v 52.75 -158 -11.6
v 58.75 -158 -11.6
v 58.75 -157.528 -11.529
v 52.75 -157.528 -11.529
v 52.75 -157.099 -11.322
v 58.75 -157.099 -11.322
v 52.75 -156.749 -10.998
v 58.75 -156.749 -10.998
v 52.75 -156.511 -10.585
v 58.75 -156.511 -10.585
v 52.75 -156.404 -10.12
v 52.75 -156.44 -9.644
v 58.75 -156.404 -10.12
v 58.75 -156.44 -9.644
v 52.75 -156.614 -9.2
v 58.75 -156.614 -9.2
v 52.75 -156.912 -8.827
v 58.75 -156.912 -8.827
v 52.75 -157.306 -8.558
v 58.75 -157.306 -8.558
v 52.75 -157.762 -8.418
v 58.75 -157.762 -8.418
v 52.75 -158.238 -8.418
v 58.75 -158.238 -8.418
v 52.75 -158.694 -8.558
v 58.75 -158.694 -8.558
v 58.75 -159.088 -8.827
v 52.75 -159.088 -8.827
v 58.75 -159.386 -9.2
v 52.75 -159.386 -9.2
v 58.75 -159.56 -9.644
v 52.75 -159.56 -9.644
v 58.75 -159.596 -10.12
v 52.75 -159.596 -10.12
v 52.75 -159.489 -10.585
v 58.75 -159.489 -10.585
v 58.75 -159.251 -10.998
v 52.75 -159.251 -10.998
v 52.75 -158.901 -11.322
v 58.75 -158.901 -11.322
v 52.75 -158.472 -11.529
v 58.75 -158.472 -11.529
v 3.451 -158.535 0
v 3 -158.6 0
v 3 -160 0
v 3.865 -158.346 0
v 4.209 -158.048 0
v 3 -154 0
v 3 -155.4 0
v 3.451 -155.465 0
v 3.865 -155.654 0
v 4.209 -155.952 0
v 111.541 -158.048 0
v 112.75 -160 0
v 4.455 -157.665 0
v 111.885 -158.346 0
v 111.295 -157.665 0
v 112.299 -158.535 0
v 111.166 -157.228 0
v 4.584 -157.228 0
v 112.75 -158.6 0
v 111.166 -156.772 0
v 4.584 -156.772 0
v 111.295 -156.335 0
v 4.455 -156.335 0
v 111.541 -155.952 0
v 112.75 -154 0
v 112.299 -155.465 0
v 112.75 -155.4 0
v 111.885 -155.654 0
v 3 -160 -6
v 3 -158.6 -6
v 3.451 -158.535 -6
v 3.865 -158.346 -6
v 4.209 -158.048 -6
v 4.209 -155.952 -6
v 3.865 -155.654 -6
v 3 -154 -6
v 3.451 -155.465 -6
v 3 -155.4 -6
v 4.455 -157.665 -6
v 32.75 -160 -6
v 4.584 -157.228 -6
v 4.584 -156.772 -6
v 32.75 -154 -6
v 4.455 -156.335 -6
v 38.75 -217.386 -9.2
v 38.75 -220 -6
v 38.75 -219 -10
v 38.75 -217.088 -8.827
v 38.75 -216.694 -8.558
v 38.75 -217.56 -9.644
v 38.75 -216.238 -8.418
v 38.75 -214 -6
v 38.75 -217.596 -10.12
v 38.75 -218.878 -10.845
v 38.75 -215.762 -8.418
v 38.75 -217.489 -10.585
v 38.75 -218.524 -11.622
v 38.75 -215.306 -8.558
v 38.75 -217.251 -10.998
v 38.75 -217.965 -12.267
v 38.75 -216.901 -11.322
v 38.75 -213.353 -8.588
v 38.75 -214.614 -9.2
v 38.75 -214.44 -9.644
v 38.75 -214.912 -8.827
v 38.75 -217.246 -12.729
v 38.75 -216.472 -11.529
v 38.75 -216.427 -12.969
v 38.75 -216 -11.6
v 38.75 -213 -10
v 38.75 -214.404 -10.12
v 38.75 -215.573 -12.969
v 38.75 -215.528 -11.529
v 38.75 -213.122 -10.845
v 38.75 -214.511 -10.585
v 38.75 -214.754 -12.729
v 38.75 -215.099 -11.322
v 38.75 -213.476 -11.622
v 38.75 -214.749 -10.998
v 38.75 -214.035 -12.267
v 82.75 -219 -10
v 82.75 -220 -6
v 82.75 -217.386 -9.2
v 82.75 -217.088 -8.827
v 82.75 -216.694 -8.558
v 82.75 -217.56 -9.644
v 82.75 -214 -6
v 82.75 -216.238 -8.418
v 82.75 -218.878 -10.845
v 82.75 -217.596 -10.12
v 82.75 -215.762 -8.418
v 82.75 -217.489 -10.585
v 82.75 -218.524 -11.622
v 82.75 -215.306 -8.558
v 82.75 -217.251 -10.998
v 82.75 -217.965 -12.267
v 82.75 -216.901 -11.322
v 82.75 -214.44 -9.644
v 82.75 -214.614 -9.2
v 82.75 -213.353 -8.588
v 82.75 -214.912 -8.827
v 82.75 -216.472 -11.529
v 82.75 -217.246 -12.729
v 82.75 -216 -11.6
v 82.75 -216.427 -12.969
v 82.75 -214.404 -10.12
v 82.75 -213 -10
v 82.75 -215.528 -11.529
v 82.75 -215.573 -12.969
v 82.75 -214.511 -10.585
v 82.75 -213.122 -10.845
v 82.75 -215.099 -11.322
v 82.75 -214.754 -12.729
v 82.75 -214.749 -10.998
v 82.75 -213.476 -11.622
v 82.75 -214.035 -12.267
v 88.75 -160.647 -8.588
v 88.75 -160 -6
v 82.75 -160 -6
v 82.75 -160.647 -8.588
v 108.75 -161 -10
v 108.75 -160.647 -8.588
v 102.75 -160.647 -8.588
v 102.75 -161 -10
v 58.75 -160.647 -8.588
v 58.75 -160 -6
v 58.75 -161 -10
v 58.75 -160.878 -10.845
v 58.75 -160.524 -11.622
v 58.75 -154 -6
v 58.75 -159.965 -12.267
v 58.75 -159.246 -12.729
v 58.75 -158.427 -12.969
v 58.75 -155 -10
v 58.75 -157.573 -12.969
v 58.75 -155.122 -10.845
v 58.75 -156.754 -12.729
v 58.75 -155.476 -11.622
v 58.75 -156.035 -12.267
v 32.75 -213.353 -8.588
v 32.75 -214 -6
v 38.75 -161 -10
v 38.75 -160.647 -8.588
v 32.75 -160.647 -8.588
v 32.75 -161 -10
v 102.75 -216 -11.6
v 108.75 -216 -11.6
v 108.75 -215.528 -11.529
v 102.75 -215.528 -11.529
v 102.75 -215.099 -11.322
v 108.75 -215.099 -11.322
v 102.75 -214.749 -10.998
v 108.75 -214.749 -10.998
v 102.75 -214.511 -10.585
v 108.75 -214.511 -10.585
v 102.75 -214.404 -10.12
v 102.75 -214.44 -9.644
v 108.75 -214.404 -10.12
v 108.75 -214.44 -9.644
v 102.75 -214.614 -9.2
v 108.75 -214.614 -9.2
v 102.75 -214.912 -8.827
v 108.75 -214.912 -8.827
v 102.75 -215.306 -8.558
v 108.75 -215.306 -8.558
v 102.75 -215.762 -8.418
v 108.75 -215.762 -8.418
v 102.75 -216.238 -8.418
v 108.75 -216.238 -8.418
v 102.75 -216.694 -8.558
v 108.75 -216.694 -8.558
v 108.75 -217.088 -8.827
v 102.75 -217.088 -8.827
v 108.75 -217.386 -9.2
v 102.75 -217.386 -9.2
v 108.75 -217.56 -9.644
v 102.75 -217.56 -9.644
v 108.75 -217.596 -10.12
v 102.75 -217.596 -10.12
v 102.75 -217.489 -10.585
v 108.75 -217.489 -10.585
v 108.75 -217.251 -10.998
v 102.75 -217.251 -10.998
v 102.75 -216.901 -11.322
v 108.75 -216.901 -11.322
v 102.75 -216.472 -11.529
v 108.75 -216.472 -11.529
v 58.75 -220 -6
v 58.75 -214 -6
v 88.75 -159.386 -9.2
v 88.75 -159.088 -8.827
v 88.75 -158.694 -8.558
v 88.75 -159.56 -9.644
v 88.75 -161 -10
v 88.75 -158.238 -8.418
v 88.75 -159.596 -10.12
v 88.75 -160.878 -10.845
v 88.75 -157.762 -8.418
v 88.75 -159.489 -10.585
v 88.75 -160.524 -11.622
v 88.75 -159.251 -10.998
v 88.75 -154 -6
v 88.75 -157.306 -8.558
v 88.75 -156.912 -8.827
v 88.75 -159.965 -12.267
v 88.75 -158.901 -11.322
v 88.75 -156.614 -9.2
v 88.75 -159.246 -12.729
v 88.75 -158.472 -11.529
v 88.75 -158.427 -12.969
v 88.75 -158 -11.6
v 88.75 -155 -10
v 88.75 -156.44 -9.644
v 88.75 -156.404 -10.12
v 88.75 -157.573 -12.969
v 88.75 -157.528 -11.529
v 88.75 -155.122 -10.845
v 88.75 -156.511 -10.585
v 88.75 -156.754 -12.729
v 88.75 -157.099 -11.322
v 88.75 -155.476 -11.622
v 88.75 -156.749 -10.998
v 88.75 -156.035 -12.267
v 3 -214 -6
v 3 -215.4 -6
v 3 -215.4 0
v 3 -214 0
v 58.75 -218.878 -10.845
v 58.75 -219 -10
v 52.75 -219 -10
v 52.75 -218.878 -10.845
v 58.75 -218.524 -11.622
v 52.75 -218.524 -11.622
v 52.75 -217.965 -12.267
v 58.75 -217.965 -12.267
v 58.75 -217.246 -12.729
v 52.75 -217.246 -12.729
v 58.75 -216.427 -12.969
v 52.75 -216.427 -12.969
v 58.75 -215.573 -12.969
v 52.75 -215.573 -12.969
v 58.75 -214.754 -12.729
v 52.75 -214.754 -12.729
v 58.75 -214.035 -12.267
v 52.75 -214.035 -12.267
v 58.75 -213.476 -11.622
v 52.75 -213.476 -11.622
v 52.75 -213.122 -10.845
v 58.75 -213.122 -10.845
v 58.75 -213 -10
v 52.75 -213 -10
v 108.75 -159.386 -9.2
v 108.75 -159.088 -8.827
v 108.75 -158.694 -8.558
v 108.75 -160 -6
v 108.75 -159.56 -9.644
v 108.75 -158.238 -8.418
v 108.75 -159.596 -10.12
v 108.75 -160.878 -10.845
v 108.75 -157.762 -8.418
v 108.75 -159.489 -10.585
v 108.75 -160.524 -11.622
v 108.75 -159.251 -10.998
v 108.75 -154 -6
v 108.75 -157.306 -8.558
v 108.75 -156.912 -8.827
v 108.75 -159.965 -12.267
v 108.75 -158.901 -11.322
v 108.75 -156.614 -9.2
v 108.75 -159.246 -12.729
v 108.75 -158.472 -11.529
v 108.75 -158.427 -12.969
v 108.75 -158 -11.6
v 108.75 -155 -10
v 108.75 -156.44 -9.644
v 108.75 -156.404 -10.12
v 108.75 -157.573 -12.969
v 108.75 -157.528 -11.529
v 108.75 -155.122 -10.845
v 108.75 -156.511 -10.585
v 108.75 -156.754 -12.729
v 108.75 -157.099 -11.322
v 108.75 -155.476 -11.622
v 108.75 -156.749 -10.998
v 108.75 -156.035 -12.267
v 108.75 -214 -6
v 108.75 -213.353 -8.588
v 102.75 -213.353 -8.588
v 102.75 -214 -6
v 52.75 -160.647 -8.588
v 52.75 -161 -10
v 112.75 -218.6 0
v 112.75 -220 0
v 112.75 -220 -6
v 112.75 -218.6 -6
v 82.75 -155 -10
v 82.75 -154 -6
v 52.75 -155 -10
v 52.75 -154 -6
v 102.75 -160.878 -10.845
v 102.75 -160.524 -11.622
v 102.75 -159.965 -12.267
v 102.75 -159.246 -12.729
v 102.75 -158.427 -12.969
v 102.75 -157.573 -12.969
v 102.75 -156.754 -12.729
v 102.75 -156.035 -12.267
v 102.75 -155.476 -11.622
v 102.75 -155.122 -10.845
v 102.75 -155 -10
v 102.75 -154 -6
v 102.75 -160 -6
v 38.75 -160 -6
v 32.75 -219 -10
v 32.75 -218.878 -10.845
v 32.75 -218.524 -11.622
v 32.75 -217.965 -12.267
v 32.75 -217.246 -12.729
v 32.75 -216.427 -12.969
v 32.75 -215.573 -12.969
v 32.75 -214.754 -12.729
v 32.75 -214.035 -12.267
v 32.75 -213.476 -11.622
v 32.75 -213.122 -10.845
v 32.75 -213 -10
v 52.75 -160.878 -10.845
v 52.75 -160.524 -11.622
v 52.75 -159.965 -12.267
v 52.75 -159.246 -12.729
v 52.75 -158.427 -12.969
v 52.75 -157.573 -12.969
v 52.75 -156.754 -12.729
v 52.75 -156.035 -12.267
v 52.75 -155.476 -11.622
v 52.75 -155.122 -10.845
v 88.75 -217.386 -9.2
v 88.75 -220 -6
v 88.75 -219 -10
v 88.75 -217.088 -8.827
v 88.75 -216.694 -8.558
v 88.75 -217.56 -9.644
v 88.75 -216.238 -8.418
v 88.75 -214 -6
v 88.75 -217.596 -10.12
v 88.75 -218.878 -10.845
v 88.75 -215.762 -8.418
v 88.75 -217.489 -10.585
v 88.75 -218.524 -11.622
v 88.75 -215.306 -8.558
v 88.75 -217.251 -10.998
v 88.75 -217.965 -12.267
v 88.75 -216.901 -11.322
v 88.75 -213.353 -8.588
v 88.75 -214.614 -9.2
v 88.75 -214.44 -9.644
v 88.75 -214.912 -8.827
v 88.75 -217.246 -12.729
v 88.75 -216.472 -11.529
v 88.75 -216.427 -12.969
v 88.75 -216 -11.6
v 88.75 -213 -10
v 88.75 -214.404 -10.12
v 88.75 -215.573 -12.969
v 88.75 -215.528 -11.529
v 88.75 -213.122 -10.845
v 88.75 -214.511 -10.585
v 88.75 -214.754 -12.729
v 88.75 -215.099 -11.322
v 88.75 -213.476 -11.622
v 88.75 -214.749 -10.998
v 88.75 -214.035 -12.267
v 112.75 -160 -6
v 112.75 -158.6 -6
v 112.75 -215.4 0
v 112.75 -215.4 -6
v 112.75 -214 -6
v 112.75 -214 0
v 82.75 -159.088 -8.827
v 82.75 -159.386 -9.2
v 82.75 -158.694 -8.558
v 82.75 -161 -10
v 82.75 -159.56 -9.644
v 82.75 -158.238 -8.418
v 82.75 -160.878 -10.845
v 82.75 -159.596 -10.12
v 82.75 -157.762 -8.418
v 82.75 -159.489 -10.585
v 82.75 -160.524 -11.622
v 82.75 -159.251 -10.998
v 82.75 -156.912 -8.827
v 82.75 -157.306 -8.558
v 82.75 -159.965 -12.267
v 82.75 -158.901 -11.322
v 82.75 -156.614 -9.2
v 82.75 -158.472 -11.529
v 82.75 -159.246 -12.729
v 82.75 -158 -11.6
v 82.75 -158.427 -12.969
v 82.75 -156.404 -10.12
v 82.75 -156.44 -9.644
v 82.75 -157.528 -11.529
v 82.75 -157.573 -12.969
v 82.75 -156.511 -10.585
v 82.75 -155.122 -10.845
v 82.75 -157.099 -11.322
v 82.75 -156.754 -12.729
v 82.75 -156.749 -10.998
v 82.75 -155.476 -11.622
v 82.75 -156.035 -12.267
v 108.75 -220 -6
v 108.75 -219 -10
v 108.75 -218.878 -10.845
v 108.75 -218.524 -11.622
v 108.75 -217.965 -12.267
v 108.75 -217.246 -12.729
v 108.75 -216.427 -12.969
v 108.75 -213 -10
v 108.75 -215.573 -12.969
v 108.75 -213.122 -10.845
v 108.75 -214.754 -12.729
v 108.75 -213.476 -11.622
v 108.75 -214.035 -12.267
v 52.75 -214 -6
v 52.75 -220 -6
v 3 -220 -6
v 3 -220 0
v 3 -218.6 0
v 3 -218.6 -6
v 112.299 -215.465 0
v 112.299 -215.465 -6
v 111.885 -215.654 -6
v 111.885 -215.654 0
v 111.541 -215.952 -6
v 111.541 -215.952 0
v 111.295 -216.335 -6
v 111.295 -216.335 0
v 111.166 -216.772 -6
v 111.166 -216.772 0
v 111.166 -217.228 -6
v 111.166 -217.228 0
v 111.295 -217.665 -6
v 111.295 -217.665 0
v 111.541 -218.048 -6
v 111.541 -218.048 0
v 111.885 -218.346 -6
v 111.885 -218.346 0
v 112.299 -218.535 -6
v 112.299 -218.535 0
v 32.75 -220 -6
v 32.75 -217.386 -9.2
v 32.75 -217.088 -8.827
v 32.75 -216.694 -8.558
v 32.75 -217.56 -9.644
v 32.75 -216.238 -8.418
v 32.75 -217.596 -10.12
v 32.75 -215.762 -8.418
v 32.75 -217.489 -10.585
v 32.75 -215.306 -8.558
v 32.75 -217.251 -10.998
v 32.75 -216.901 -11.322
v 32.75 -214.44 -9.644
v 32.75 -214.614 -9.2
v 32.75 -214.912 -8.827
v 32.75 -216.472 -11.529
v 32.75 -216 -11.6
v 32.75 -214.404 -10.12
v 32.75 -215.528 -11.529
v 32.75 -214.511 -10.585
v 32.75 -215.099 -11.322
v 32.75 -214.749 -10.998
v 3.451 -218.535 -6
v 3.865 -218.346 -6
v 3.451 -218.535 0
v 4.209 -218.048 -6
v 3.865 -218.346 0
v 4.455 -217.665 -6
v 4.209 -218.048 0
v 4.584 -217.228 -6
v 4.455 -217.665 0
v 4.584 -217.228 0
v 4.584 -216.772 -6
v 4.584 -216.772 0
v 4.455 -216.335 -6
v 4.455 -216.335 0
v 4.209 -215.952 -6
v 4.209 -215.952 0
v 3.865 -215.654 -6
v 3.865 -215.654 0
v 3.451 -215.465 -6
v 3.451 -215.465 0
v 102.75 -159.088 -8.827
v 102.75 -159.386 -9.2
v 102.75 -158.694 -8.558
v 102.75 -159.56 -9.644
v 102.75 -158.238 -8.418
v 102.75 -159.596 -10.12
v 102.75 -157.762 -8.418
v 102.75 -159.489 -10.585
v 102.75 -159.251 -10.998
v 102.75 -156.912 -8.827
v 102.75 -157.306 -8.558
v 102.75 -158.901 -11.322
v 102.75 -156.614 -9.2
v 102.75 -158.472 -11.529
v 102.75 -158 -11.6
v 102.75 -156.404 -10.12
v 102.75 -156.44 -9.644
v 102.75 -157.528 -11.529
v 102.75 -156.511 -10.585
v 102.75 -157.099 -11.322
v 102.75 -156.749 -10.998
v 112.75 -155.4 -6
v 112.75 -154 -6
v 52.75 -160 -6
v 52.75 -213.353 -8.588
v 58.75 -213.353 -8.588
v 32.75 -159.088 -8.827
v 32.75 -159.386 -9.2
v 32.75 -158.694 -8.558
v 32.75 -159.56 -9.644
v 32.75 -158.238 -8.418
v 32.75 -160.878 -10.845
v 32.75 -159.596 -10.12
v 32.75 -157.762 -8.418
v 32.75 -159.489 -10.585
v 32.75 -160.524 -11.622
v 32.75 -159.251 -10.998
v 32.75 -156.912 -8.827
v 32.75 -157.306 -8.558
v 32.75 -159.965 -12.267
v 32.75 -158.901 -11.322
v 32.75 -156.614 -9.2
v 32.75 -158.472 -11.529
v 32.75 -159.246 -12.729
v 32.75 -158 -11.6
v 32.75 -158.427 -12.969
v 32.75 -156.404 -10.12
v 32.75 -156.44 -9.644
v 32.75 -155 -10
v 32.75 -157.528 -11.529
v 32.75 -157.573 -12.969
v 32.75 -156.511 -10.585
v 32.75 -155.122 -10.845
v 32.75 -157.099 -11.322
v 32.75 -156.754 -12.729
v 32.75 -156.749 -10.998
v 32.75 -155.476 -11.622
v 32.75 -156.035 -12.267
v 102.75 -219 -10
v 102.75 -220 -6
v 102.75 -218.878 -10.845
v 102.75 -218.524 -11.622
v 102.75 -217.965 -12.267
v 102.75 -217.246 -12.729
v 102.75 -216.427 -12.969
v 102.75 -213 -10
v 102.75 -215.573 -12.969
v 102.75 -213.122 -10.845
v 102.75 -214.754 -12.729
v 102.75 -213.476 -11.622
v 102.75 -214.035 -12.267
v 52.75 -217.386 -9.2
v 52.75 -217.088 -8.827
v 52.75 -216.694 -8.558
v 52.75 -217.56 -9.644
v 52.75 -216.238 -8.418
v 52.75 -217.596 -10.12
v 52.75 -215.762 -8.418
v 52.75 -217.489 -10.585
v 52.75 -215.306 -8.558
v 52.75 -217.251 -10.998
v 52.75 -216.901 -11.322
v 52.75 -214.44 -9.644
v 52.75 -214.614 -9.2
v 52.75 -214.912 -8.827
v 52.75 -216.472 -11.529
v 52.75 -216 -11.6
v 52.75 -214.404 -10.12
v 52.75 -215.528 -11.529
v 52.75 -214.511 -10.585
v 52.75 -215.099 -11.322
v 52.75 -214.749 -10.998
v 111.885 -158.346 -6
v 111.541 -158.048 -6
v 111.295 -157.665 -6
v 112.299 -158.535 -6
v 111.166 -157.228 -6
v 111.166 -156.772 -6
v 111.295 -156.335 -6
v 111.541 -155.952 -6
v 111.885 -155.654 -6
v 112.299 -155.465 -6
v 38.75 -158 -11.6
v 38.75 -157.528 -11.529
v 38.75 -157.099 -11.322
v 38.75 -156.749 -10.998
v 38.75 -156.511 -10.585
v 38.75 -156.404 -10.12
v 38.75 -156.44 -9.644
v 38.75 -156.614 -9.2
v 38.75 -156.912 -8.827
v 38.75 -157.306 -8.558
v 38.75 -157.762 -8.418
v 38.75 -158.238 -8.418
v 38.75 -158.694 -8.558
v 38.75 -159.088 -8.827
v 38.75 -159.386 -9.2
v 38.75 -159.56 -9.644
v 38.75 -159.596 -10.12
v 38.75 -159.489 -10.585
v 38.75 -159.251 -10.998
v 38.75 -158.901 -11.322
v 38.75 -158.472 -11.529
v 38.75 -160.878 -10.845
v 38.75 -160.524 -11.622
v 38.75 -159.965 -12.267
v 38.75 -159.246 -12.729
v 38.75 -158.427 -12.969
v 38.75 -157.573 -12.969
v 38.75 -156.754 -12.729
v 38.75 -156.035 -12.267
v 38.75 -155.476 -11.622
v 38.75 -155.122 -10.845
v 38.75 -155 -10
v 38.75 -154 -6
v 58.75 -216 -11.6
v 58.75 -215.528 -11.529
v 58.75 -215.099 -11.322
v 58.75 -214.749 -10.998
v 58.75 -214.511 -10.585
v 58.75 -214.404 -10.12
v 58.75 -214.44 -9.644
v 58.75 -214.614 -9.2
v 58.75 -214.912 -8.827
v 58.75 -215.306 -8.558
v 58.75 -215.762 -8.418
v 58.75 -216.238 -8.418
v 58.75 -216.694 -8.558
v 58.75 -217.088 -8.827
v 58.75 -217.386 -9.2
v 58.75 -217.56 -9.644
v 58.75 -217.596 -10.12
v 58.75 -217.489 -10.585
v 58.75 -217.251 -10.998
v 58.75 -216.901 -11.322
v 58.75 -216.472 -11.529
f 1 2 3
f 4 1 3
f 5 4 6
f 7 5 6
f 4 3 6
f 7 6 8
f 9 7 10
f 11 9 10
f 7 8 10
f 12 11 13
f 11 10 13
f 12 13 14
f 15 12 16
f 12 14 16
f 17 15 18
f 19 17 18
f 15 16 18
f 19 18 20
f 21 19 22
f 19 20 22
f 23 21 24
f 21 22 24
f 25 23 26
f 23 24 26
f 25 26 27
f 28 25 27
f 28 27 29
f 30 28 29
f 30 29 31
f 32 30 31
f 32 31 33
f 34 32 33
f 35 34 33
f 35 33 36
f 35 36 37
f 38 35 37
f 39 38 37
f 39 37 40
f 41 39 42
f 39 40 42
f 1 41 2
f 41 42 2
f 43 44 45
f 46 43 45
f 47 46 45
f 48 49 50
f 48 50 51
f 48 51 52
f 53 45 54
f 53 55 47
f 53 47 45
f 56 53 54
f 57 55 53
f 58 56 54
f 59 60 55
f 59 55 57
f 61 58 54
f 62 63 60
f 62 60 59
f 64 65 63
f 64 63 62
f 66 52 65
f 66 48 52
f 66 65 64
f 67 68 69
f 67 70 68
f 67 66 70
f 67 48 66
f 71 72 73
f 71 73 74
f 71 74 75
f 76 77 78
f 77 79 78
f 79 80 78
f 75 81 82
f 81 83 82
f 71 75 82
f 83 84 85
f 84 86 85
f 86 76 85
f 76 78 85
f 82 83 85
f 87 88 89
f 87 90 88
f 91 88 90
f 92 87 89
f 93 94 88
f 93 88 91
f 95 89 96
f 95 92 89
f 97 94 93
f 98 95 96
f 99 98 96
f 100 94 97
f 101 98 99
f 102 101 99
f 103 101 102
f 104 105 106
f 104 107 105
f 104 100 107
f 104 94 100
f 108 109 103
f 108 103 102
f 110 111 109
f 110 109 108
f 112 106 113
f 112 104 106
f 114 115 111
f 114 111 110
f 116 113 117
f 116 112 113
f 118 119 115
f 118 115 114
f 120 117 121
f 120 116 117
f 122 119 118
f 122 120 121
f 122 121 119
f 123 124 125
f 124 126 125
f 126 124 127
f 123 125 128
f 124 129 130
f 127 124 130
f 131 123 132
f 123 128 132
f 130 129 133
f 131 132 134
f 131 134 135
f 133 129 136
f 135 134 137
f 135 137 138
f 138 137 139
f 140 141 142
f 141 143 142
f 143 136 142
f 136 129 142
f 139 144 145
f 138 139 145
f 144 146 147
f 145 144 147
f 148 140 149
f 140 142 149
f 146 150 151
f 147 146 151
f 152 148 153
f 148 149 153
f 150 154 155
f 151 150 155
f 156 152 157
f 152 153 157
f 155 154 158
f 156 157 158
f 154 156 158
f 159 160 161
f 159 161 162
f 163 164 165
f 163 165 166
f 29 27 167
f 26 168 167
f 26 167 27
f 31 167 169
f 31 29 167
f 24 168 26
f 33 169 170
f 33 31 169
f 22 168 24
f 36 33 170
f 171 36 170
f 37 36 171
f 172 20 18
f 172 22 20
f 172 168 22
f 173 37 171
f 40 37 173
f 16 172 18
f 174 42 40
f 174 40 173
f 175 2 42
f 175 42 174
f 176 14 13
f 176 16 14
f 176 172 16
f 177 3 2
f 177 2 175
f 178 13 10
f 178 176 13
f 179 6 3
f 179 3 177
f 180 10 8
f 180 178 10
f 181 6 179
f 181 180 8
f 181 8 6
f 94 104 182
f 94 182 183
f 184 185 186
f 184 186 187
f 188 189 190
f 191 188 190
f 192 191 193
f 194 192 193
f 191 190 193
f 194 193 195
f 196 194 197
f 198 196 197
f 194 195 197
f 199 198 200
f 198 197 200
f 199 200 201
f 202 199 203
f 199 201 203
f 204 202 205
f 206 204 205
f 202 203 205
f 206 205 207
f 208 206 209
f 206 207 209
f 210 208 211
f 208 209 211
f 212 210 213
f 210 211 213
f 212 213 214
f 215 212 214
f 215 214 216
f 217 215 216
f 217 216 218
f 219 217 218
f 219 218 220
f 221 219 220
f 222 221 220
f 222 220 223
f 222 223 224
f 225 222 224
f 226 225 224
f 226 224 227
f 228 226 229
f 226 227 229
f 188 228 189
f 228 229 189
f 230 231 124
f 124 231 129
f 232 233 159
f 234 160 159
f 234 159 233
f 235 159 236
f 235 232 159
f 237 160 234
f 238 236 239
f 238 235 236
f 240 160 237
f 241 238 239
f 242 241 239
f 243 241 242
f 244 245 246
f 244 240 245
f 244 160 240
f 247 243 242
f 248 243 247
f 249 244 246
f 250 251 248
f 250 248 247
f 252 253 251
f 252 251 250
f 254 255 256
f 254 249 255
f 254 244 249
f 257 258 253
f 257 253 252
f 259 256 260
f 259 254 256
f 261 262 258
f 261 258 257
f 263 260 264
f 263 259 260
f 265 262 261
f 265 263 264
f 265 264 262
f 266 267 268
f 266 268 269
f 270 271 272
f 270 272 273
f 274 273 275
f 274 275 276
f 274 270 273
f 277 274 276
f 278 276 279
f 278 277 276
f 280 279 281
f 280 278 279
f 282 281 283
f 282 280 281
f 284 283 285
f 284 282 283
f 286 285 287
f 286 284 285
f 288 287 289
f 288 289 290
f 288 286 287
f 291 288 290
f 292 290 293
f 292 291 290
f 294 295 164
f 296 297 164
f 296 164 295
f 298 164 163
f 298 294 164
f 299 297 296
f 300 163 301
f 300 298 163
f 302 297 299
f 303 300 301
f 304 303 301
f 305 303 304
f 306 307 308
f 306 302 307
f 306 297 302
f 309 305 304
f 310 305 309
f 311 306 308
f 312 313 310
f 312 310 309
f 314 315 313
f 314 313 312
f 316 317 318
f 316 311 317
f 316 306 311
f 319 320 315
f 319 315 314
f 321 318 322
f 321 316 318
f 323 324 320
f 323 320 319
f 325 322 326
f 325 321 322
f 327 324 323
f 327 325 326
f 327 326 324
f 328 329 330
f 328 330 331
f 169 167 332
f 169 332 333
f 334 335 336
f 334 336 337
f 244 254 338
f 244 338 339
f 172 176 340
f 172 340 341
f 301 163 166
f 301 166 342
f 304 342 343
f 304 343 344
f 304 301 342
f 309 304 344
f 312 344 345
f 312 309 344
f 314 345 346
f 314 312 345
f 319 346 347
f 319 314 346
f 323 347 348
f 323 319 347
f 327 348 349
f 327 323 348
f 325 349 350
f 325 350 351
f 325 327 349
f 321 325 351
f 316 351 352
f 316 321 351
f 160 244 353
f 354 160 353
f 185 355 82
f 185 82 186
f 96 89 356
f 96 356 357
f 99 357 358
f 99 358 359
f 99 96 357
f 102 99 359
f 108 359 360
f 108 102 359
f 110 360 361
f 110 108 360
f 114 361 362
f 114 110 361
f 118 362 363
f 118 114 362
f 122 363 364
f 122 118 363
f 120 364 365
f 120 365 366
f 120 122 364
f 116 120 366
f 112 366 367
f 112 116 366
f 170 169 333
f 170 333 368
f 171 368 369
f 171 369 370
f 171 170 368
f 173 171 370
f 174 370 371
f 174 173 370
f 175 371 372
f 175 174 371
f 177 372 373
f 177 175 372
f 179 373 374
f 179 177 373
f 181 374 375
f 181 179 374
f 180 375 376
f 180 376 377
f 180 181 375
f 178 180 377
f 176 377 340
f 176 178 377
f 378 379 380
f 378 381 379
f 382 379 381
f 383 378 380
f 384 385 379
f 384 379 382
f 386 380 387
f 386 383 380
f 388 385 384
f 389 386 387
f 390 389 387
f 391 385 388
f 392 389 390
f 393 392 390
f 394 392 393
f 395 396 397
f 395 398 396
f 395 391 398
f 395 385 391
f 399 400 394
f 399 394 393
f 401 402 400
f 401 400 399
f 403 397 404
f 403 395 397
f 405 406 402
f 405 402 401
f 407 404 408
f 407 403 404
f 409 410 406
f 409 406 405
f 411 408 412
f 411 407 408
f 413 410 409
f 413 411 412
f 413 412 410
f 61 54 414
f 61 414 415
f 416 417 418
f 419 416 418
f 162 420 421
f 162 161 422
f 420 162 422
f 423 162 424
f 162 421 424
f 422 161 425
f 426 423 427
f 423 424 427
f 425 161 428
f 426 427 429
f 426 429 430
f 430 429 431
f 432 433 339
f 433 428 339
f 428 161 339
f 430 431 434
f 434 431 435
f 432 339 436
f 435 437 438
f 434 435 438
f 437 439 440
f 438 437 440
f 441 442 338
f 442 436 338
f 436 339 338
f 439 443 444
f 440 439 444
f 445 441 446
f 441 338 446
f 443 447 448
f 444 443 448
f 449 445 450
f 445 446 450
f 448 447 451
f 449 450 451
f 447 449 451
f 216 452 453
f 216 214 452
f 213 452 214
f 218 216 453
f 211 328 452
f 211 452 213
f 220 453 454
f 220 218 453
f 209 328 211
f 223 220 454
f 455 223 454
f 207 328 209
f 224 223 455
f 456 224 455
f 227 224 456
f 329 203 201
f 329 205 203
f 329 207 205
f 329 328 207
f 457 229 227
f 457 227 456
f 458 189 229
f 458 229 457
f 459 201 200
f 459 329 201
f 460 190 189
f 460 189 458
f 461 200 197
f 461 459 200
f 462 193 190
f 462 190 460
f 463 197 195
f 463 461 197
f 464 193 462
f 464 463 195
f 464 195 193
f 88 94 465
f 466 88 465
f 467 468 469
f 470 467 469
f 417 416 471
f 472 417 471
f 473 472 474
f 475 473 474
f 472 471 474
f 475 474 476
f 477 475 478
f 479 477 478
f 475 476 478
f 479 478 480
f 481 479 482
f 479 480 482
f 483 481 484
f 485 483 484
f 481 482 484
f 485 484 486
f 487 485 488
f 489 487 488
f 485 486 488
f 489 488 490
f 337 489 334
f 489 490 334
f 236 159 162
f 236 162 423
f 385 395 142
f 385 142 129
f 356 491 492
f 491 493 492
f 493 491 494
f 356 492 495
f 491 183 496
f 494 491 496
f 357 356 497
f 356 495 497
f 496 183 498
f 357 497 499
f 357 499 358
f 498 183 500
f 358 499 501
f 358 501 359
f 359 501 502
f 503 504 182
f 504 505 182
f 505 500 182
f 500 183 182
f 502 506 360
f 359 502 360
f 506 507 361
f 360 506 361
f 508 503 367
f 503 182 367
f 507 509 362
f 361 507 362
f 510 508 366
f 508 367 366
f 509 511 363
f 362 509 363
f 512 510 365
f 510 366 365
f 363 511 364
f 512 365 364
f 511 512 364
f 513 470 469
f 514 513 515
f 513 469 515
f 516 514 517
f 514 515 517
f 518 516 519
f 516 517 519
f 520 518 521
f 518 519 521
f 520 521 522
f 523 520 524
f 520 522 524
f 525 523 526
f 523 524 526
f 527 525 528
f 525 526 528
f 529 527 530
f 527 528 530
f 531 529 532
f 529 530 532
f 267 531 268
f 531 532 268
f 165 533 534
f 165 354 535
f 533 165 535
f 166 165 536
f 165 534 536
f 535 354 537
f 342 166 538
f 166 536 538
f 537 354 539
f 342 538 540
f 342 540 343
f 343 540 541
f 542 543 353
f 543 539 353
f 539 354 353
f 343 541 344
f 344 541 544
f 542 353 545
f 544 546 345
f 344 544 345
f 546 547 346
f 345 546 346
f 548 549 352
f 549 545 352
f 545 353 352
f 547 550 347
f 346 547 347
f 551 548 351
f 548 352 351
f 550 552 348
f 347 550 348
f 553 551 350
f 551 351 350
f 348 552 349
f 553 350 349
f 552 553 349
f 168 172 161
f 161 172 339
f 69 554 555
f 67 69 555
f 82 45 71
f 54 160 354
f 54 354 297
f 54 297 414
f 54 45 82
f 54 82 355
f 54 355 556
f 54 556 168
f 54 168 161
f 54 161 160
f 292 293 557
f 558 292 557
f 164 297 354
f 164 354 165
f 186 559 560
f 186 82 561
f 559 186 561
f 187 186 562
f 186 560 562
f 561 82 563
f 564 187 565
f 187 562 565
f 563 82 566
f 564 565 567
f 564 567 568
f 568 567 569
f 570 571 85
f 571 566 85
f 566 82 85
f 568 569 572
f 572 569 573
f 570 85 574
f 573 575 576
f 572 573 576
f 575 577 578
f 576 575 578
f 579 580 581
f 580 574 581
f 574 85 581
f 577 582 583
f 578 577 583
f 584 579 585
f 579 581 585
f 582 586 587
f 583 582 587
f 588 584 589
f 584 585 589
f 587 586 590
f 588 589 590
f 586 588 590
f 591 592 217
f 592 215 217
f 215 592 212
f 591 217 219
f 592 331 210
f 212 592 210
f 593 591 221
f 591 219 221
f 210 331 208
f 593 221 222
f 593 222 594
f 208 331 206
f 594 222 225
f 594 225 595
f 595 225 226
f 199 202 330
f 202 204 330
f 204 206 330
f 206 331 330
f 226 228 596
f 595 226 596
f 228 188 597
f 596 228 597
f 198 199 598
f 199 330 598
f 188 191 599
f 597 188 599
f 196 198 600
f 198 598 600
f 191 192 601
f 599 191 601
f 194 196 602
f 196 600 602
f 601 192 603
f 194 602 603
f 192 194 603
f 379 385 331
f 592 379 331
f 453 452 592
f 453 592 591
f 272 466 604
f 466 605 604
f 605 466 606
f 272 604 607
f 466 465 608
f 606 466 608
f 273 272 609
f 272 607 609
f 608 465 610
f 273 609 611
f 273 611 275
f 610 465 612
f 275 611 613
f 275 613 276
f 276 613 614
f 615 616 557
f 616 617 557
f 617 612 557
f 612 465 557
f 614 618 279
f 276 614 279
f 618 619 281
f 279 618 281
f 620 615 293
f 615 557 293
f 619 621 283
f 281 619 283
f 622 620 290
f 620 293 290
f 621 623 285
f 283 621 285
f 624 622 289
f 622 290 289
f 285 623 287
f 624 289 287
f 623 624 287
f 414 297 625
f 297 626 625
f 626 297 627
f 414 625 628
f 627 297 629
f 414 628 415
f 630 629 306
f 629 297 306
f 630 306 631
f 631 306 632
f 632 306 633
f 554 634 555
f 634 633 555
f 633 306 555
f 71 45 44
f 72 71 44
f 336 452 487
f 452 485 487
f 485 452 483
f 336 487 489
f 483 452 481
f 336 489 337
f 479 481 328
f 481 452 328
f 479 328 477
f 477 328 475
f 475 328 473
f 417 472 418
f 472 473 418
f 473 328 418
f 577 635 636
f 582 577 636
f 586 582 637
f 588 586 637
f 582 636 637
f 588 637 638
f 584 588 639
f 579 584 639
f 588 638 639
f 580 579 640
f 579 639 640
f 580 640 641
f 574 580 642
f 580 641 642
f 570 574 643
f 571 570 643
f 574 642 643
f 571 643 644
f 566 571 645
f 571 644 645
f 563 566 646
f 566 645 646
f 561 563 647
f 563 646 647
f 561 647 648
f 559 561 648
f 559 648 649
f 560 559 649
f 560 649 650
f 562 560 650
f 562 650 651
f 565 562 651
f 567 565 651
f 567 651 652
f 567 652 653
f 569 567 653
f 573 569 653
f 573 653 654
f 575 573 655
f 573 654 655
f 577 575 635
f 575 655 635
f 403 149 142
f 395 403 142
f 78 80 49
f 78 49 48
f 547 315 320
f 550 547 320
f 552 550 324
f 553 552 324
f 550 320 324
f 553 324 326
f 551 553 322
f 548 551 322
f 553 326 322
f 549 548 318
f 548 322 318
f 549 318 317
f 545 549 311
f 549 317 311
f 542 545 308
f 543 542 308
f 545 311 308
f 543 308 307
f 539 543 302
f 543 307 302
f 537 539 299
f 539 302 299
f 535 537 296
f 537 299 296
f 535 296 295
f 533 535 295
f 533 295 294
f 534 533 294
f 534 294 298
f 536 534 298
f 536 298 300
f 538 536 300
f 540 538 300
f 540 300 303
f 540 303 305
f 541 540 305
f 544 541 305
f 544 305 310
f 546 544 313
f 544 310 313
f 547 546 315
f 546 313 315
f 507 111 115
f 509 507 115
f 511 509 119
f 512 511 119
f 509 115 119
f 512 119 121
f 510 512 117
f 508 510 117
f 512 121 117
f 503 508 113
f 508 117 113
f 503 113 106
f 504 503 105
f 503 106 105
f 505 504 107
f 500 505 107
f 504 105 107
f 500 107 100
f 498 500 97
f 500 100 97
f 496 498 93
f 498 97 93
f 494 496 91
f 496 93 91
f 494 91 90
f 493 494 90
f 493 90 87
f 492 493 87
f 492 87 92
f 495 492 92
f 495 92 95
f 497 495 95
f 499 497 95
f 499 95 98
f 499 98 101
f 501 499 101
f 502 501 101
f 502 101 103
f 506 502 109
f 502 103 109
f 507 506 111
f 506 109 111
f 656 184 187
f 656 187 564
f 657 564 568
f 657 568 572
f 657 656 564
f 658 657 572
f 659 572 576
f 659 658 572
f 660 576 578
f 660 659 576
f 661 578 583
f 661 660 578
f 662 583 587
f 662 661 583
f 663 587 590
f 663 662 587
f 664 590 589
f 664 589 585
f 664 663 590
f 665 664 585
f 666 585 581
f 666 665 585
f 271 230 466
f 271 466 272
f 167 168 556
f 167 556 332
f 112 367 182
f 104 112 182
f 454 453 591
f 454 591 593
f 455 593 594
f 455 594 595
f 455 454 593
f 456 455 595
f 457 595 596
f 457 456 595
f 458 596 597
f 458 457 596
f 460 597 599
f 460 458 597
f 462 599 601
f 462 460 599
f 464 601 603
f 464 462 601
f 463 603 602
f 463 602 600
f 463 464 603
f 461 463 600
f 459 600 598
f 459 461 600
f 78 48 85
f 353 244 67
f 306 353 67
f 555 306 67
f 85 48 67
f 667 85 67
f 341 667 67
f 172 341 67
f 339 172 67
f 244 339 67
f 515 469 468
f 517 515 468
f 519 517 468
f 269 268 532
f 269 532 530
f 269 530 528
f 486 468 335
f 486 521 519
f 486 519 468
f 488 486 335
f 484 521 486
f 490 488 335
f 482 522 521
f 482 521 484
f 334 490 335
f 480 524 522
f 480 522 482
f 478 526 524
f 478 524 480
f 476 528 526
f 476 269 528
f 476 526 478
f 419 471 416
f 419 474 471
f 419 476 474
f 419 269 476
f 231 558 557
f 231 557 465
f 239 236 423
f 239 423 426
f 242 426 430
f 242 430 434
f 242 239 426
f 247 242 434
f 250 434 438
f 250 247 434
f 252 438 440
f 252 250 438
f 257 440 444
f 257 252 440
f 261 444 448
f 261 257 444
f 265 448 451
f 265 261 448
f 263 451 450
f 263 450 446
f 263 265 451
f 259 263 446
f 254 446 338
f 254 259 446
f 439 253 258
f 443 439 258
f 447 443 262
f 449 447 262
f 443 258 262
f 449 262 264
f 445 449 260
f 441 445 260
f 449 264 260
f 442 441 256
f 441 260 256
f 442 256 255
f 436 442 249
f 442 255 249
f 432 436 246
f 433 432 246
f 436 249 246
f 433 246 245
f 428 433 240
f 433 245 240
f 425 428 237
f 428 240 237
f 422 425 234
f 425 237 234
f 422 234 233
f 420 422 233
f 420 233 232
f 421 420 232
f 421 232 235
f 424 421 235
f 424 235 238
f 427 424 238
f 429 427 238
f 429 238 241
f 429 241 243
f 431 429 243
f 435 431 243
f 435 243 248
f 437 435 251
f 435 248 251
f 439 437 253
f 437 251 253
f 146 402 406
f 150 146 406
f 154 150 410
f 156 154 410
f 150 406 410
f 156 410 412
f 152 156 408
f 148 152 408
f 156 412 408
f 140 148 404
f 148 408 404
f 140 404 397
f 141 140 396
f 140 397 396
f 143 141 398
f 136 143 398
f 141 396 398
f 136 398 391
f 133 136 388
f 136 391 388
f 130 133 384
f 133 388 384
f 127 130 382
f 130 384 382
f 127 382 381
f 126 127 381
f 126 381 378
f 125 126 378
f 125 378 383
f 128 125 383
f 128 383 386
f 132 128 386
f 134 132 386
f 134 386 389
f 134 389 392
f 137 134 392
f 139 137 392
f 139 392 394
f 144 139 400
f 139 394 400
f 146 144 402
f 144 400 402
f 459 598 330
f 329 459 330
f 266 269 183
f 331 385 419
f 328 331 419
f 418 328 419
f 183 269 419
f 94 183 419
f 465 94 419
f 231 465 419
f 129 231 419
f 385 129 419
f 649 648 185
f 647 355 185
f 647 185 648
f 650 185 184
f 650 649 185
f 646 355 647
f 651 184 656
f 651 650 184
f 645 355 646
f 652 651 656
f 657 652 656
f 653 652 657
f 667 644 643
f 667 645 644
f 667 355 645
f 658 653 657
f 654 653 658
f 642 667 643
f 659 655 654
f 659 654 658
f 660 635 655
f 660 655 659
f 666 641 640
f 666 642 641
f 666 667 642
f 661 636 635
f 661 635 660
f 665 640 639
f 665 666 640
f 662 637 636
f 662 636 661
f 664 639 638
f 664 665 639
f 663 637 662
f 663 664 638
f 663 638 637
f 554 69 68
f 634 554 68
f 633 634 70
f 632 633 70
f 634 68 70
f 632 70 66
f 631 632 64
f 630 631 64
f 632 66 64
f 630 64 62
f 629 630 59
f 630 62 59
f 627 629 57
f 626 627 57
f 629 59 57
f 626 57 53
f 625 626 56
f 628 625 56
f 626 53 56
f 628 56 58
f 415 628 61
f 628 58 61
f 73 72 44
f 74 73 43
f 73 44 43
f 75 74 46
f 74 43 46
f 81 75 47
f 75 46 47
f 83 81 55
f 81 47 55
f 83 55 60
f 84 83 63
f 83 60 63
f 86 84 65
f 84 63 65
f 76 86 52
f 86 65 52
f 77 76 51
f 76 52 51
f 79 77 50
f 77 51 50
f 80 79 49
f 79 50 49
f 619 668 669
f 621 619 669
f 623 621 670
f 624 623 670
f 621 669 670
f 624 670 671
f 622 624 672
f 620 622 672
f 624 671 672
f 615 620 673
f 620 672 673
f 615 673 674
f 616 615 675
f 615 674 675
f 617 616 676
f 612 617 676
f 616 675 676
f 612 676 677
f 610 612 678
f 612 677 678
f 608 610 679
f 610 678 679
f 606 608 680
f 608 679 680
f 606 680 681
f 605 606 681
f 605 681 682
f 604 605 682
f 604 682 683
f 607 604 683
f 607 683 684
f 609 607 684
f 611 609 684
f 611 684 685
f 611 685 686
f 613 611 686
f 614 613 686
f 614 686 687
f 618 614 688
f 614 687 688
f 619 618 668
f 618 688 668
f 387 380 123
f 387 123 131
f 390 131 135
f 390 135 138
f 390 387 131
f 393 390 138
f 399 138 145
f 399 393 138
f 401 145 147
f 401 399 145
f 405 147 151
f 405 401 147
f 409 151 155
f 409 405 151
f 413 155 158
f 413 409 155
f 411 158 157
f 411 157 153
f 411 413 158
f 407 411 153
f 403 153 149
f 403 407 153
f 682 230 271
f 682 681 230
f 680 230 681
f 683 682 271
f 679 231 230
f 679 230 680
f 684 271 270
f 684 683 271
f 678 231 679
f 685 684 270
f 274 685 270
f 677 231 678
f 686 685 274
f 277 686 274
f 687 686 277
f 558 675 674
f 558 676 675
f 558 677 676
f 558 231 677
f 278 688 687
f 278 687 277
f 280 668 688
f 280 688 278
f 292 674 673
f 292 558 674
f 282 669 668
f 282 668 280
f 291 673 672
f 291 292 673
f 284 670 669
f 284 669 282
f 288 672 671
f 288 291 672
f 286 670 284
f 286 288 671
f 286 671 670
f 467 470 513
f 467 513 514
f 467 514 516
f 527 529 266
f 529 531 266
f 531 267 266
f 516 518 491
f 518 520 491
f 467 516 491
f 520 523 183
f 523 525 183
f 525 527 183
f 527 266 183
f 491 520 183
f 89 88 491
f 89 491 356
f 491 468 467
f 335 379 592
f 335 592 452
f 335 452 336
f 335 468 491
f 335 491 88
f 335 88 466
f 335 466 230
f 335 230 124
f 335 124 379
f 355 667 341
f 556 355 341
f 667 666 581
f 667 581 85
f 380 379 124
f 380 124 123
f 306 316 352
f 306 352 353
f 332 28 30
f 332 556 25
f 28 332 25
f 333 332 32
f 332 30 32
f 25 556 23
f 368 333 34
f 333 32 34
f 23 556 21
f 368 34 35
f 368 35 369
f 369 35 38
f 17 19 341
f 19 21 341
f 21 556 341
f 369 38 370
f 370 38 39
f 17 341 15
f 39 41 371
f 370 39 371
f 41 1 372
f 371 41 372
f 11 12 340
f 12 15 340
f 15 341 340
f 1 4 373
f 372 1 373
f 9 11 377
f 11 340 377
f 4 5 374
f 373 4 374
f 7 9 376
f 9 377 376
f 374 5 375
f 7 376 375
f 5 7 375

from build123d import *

# Parameters (mm, degrees)
SKETCH1_W             = 109.75
SKETCH1_H             = 6
BOSS_EXTRUDE1_DEPTH   = 6
BOSS_EXTRUDE1_2_DEPTH = 6
BOSS_EXTRUDE2_START   = -4
SKETCH2_R             = 1.6
BOSS_EXTRUDE2_DEPTH   = 6
LPATTERN1_COUNT       = 8
LPATTERN1_PITCH       = 10
CUT_EXTRUDE1_REACH    = 249.551
SKETCH3_R             = 1.6


with BuildPart() as part:
    # Sketch1 → Boss-Extrude1 (new body)
    with BuildSketch(Plane.XY):
        with Locations((57.875, -217)):
            Rectangle(SKETCH1_W, SKETCH1_H)
    extrude(amount=-BOSS_EXTRUDE1_DEPTH)



with BuildPart() as body_2:
    # Sketch1 → Boss-Extrude1 2 (new body)
    with BuildSketch(Plane.XY):
        with Locations((57.875, -157)):
            Rectangle(SKETCH1_W, SKETCH1_H)
    extrude(amount=-BOSS_EXTRUDE1_2_DEPTH)


with BuildPart() as part_1:
    add(part.part)

    add(body_2.part)  # Boss-Extrude2 merges body 2
    # Sketch2 → Boss-Extrude2 (add)
    # profile 1 of 4: a face of its own
    with BuildSketch(Plane(origin=(112.75, 0, 0), x_dir=(0, 0, -1), z_dir=(1, 0, 0)).offset(BOSS_EXTRUDE2_START)):
        with BuildLine():
            Line((10, -213), (8.588235294, -213.352941176))
            ThreePointArc((8.588235294, -213.352941176), (7.0895725, -216.727606875), (10, -219))
            ThreePointArc((10, -219), (13, -216), (10, -213))
        make_face()
        with Locations((10, -216)):
            Circle(SKETCH2_R, mode=Mode.SUBTRACT)
    # profile 2 of 4: a face of its own
    with BuildSketch(Plane(origin=(112.75, 0, 0), x_dir=(0, 0, -1), z_dir=(1, 0, 0)).offset(BOSS_EXTRUDE2_START)):
        with BuildLine():
            Line((8.588235294, -213.352941176), (6, -214))
            Line((6, -214), (6, -220))
            Line((6, -220), (10, -219))
            ThreePointArc((10, -219), (7.0895725, -216.727606875), (8.588235294, -213.352941176))
        make_face()
    # profile 3 of 4: a face of its own
    with BuildSketch(Plane(origin=(112.75, 0, 0), x_dir=(0, 0, -1), z_dir=(1, 0, 0)).offset(BOSS_EXTRUDE2_START)):
        with BuildLine():
            ThreePointArc((10, -161), (13, -158), (10, -155))
            ThreePointArc((10, -155), (7.0895725, -157.272393125), (8.588235294, -160.647058824))
            Line((8.588235294, -160.647058824), (10, -161))
        make_face()
        with Locations((10, -158)):
            Circle(SKETCH2_R, mode=Mode.SUBTRACT)
    # profile 4 of 4: a face of its own
    with BuildSketch(Plane(origin=(112.75, 0, 0), x_dir=(0, 0, -1), z_dir=(1, 0, 0)).offset(BOSS_EXTRUDE2_START)):
        with BuildLine():
            Line((10, -155), (6, -154))
            Line((6, -154), (6, -160))
            Line((6, -160), (8.588235294, -160.647058824))
            ThreePointArc((8.588235294, -160.647058824), (7.0895725, -157.272393125), (10, -155))
        make_face()
    boss_extrude2 = extrude(amount=-BOSS_EXTRUDE2_DEPTH)

    # LPattern1: Boss-Extrude2 ×8, 4 skipped
    with Locations(*[(-i * LPATTERN1_PITCH, 0, 0) for i in range(1, LPATTERN1_COUNT) if i not in (1, 3, 4, 6)]):
        add(boss_extrude2)

    # Sketch3 → Cut-Extrude1 (cut, up to next)
    with BuildSketch(Plane.XY, mode=Mode.PRIVATE) as cut_extrude1_sk1:
        with Locations((3, -217)):
            Circle(SKETCH3_R)
    cut_extrude1_tool1 = extrude(cut_extrude1_sk1.sketch, amount=-CUT_EXTRUDE1_REACH, mode=Mode.PRIVATE) & part_1.part
    # Sketch3 → Cut-Extrude1 (cut, up to next)
    with BuildSketch(Plane.XY, mode=Mode.PRIVATE) as cut_extrude1_sk2:
        with Locations((3, -157)):
            Circle(SKETCH3_R)
    cut_extrude1_tool2 = extrude(cut_extrude1_sk2.sketch, amount=-CUT_EXTRUDE1_REACH, mode=Mode.PRIVATE) & part_1.part
    # Sketch3 → Cut-Extrude1 (cut, up to next)
    with BuildSketch(Plane.XY, mode=Mode.PRIVATE) as cut_extrude1_sk3:
        with Locations((112.75, -157)):
            Circle(SKETCH3_R)
    cut_extrude1_tool3 = extrude(cut_extrude1_sk3.sketch, amount=-CUT_EXTRUDE1_REACH, mode=Mode.PRIVATE) & part_1.part
    # Sketch3 → Cut-Extrude1 (cut, up to next)
    with BuildSketch(Plane.XY, mode=Mode.PRIVATE) as cut_extrude1_sk4:
        with Locations((112.75, -217)):
            Circle(SKETCH3_R)
    cut_extrude1_tool4 = extrude(cut_extrude1_sk4.sketch, amount=-CUT_EXTRUDE1_REACH, mode=Mode.PRIVATE) & part_1.part
    add(cut_extrude1_tool1.solids().sort_by_distance((3, -217, 0))[0], mode=Mode.SUBTRACT)
    add(cut_extrude1_tool2.solids().sort_by_distance((3, -157, 0))[0], mode=Mode.SUBTRACT)
    add(cut_extrude1_tool3.solids().sort_by_distance((112.75, -157, 0))[0], mode=Mode.SUBTRACT)
    add(cut_extrude1_tool4.solids().sort_by_distance((112.75, -217, 0))[0], mode=Mode.SUBTRACT)


solid = part_1.part
